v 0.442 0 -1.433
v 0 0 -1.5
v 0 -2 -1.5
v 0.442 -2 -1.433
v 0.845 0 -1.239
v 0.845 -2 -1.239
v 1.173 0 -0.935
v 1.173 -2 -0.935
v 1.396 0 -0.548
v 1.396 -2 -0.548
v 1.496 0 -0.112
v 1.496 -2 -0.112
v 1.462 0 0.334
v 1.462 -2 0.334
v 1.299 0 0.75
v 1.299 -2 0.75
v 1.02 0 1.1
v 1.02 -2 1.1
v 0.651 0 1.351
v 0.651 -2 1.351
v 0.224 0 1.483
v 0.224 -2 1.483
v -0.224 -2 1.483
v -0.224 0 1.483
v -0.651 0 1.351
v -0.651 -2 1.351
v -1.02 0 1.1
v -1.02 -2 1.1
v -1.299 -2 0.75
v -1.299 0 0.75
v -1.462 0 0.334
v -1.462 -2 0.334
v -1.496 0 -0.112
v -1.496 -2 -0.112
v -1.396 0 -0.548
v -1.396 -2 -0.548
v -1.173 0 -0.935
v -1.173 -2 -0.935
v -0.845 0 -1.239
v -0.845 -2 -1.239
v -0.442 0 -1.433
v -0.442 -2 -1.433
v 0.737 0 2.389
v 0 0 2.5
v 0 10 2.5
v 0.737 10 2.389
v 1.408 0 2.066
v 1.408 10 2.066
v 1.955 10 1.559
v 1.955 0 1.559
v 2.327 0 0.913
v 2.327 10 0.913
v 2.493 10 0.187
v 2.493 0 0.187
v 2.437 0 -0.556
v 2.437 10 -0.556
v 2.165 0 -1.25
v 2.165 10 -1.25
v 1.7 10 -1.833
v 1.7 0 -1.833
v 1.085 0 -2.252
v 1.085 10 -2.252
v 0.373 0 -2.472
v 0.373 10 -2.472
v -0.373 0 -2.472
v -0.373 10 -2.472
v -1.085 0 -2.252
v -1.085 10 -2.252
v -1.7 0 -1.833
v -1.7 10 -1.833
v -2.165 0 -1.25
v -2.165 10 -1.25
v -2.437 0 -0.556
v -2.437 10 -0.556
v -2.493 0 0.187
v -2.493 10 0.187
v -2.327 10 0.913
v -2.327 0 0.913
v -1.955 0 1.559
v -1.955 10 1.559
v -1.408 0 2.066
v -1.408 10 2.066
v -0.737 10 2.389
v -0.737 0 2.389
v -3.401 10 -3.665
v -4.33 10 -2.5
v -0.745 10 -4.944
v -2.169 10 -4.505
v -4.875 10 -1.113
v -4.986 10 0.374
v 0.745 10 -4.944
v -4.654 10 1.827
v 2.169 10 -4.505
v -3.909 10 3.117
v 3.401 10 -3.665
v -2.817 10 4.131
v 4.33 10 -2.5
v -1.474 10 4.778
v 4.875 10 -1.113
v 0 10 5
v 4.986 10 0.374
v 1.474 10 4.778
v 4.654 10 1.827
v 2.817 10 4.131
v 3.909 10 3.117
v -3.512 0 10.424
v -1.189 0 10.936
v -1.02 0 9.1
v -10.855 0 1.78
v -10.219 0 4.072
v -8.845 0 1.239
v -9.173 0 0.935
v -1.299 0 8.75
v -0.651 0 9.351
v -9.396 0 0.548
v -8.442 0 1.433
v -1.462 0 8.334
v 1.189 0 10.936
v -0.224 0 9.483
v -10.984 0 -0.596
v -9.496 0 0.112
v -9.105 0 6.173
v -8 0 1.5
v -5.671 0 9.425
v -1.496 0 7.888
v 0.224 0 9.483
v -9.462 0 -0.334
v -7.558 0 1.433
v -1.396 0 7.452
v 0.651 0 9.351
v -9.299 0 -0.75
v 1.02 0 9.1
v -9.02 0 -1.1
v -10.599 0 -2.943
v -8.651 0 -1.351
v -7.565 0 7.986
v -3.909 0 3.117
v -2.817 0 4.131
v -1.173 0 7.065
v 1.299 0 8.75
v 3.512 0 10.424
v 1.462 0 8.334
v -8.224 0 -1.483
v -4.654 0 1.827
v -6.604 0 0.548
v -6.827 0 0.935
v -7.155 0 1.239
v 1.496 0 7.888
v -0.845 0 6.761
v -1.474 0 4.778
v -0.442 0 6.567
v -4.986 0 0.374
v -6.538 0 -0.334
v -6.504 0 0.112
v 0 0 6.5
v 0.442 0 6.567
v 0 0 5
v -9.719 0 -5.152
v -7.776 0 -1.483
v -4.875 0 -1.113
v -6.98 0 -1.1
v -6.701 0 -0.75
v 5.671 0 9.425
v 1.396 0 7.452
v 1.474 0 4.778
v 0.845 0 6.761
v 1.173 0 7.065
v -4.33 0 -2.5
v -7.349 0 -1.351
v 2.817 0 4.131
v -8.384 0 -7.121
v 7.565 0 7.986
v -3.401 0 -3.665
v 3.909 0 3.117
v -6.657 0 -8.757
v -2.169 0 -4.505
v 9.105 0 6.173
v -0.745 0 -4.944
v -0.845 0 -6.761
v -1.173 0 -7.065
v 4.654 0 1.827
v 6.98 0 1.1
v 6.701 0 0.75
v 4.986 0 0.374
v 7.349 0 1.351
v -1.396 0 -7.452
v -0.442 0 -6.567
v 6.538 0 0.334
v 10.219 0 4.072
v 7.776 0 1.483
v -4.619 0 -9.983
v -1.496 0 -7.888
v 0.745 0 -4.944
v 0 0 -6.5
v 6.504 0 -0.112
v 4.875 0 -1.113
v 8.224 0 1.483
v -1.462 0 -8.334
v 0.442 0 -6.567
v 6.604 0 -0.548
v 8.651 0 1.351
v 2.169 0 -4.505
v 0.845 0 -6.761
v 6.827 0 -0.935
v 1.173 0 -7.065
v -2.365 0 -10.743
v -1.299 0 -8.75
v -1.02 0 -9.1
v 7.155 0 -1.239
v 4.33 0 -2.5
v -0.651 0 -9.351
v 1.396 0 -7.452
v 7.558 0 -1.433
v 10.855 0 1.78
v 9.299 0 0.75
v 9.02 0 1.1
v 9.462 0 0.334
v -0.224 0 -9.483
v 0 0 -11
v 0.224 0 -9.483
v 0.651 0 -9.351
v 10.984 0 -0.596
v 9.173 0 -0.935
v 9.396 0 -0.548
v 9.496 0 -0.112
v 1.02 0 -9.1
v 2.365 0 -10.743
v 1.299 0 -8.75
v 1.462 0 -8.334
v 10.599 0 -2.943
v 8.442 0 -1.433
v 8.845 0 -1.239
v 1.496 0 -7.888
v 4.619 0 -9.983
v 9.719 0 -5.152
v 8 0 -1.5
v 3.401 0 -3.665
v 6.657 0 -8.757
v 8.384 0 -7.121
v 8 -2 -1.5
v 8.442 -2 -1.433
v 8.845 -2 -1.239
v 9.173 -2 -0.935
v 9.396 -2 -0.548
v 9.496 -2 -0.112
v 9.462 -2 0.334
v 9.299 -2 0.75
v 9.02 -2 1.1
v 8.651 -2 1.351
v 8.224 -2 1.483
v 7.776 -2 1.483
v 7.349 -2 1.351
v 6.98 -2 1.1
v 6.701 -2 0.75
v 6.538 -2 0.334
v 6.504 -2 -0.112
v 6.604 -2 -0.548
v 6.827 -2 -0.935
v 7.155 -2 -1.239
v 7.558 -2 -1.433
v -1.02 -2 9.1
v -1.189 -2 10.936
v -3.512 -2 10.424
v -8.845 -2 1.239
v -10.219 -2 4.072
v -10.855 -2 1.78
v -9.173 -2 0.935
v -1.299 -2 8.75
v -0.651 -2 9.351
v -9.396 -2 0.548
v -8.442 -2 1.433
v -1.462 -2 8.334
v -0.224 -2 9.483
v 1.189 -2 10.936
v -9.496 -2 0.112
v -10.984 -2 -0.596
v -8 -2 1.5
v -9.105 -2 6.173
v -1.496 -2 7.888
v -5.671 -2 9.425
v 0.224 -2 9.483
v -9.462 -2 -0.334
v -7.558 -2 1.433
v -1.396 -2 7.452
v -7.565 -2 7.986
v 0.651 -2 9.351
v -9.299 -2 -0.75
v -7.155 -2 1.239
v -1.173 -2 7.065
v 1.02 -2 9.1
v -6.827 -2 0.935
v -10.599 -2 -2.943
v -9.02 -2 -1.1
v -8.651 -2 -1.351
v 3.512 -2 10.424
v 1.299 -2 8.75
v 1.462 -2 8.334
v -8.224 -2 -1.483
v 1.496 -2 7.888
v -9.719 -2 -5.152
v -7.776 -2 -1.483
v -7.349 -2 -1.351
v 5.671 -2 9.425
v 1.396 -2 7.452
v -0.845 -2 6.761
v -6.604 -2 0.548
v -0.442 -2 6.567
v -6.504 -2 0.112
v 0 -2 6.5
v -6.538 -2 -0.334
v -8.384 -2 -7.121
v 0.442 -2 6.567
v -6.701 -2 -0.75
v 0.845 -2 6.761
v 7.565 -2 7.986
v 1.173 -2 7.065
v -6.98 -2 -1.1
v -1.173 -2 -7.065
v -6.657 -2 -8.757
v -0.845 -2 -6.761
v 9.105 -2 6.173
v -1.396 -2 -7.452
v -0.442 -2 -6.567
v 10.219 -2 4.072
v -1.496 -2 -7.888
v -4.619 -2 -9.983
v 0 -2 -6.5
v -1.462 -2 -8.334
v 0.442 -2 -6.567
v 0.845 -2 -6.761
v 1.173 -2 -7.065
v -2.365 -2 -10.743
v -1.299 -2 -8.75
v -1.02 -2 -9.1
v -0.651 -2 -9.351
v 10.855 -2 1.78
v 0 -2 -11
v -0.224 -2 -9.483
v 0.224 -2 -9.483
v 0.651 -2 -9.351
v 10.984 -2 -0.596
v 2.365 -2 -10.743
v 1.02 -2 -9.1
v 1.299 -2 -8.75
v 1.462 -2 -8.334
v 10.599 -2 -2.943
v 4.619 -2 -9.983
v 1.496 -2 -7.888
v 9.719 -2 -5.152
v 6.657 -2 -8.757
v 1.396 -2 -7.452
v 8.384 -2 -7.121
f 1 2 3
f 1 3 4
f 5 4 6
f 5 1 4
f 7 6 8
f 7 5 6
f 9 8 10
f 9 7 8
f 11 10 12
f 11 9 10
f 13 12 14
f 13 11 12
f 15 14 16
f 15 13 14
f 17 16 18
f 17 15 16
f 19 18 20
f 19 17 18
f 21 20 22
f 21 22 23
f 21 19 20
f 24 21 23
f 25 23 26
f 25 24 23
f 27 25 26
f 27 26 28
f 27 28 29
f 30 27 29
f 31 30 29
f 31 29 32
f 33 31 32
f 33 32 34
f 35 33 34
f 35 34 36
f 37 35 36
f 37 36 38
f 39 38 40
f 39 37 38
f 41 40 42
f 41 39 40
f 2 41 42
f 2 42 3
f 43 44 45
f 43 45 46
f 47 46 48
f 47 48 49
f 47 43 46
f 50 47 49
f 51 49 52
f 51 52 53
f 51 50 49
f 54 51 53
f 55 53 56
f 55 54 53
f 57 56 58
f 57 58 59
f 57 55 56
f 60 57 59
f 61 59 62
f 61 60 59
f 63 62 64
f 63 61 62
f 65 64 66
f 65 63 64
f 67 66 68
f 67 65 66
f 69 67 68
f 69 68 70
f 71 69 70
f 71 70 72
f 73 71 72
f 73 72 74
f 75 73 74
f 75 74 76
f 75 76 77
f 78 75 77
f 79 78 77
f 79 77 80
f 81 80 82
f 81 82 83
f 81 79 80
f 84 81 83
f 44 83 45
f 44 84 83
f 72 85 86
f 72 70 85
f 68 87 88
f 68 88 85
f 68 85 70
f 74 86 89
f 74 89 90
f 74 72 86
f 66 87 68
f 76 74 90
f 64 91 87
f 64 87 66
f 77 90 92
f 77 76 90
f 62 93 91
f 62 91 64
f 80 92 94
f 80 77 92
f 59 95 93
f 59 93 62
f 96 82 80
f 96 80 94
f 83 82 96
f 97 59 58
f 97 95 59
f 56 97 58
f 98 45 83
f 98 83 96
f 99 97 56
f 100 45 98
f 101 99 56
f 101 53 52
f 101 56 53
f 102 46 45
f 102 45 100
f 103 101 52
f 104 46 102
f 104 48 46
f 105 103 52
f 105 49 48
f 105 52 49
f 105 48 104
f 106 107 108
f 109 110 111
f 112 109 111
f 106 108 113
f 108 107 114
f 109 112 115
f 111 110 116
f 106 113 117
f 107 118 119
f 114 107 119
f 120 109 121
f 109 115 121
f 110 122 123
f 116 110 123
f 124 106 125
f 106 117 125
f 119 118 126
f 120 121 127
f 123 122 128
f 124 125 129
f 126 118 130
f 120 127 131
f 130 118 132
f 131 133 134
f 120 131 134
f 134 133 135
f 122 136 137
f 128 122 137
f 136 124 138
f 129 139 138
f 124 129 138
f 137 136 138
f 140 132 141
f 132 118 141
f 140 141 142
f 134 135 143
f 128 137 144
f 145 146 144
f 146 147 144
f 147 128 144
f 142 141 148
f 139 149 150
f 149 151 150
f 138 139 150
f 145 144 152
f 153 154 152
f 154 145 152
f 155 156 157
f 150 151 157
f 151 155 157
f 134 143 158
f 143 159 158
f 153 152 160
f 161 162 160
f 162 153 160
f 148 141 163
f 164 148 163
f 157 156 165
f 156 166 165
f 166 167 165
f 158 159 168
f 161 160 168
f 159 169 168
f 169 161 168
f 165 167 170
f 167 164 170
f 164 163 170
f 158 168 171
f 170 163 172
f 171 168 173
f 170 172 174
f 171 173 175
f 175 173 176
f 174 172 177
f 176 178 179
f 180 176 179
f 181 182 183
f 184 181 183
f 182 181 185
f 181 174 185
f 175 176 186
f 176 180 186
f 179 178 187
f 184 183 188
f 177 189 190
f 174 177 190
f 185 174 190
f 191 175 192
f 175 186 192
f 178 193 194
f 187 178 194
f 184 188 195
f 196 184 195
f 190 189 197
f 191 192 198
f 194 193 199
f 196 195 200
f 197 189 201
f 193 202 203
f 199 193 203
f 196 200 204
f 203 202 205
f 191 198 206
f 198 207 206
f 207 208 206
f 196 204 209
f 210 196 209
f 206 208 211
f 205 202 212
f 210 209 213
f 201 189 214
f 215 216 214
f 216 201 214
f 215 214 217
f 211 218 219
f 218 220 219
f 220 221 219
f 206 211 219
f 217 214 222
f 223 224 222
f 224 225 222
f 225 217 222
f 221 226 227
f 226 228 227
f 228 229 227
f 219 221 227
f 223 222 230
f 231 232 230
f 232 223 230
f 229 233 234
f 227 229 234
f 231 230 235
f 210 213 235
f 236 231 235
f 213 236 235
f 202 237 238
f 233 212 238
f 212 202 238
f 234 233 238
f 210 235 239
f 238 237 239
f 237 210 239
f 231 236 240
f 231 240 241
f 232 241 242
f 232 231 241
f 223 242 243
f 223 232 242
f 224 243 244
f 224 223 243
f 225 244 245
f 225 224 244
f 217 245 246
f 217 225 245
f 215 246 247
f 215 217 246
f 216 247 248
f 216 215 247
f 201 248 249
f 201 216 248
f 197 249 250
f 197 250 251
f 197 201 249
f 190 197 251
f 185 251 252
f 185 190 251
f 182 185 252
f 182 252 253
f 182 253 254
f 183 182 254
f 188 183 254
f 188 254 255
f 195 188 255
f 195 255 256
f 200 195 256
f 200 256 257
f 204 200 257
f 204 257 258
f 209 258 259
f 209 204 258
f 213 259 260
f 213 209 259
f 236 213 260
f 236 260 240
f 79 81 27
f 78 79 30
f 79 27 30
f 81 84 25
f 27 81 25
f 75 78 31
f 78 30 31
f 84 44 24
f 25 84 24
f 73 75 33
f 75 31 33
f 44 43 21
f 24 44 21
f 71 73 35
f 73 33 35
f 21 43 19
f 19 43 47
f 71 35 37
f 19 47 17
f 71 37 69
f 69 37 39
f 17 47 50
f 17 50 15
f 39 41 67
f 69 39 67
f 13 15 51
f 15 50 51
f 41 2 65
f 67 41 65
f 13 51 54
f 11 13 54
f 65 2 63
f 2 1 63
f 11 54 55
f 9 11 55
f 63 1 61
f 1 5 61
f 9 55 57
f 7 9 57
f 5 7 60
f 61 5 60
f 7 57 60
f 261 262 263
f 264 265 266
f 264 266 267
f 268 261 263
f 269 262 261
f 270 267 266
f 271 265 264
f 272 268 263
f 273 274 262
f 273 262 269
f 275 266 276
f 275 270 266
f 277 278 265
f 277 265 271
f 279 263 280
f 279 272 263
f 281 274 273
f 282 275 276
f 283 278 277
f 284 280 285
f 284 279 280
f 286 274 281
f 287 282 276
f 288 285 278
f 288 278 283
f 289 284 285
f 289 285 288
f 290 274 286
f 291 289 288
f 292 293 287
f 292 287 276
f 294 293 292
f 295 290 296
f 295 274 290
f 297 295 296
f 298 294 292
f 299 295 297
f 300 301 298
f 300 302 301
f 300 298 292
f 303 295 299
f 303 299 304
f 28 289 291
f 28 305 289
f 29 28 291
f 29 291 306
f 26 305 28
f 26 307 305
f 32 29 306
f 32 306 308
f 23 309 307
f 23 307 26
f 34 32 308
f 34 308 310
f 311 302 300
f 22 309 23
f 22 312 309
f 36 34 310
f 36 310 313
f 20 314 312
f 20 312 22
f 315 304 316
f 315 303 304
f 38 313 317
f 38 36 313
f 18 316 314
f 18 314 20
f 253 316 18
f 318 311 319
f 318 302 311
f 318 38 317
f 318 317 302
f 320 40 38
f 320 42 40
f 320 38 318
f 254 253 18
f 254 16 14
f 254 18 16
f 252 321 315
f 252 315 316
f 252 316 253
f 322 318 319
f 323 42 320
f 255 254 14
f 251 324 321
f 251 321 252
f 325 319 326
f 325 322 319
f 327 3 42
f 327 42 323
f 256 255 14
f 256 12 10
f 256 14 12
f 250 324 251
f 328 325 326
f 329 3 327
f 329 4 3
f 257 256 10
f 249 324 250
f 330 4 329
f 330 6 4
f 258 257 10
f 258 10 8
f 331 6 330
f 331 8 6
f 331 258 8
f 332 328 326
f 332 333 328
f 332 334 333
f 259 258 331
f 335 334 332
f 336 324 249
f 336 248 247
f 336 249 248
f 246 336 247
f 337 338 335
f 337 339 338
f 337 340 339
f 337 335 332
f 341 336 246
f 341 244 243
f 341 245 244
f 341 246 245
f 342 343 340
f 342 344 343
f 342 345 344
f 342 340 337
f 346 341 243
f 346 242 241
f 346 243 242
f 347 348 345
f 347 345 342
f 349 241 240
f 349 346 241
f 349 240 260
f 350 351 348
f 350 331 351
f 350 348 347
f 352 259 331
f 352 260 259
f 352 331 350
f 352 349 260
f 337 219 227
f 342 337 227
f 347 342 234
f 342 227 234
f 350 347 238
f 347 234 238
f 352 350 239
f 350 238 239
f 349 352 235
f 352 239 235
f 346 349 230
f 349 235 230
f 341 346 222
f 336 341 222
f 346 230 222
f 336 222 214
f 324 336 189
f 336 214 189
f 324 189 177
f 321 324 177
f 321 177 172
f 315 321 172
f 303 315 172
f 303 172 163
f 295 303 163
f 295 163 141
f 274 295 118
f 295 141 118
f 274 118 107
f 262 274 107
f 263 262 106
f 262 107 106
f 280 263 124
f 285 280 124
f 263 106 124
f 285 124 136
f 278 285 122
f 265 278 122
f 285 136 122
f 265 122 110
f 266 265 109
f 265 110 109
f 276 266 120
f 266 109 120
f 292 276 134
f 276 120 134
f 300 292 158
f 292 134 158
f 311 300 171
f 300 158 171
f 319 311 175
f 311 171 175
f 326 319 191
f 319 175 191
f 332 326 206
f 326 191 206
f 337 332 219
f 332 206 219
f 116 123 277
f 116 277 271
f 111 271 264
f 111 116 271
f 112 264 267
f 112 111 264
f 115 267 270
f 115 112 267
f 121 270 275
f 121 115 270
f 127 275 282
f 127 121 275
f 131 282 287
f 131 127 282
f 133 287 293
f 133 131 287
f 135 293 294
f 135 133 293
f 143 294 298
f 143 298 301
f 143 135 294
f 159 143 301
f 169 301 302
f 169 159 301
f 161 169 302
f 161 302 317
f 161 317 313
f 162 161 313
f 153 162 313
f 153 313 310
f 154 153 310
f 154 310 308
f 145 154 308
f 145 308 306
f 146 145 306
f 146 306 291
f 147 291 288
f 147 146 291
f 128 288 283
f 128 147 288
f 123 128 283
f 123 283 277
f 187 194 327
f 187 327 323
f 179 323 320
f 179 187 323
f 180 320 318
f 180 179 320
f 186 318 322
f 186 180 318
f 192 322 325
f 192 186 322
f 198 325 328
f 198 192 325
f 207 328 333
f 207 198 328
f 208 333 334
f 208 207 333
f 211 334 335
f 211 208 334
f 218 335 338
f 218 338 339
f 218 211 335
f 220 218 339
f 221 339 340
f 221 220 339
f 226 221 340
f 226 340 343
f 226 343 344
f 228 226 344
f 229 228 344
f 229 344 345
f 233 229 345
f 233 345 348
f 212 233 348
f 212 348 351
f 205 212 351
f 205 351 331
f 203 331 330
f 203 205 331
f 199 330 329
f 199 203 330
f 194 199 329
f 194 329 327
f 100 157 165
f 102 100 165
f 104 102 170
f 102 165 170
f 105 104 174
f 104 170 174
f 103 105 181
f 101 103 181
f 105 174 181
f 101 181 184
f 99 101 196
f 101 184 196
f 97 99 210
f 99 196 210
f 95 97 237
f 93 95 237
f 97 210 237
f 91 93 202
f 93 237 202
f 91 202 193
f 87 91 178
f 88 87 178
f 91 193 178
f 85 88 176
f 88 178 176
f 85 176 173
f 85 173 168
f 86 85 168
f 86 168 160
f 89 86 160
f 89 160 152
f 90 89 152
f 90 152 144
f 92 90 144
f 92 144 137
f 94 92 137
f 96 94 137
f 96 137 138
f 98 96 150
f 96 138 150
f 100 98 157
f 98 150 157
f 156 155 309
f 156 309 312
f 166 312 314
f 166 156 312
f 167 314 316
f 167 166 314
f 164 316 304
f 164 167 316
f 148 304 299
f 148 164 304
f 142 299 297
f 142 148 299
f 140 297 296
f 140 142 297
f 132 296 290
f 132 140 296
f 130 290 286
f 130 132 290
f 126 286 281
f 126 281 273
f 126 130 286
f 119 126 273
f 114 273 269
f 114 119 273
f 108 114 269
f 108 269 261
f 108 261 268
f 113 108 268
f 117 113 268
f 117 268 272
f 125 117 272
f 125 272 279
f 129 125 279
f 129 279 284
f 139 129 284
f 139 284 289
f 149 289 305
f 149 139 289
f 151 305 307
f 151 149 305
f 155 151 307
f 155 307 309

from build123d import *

# Parameters (mm, degrees)
SKETCH_1_R      = 5
SKETCH_1_R_2    = 2.5
EXTRUDE_1_DEPTH = 10
SKETCH_2_R      = 11
SKETCH_2_R_2    = 1.5
EXTRUDE_2_DEPTH = 2


with BuildPart() as part:
    # 草图1 → 凸台-拉伸1 (new body)
    with BuildSketch(Plane(origin=(0, 0, 0), x_dir=(1, 0, 0), z_dir=(0, 1, 0))):
        with Locations(Location((0, 0, 0), (0, 0, 270))):
            Circle(SKETCH_1_R)
        with Locations(Location((0, 0, 0), (0, 0, 270))):
            Circle(SKETCH_1_R_2, mode=Mode.SUBTRACT)
    extrude(amount=EXTRUDE_1_DEPTH)

    # 草图2 → 凸台-拉伸2 (add)
    with BuildSketch(Plane.XZ):
        with Locations(Location((0, 0, 0), (0, 0, 270))):
            Circle(SKETCH_2_R)
        with Locations(Location((0, 8, 0), (0, 0, 270))):
            Circle(SKETCH_2_R_2, mode=Mode.SUBTRACT)
        with Locations(Location((8, 0, 0), (0, 0, 270))):
            Circle(SKETCH_2_R_2, mode=Mode.SUBTRACT)
        with Locations(Location((-8, 0, 0), (0, 0, 90))):
            Circle(SKETCH_2_R_2, mode=Mode.SUBTRACT)
        with Locations(Location((0, -8, 0), (0, 0, 90))):
            Circle(SKETCH_2_R_2, mode=Mode.SUBTRACT)
        with Locations(Location((0, 0, 0), (0, 0, 270))):
            Circle(SKETCH_2_R_2, mode=Mode.SUBTRACT)
    extrude(amount=EXTRUDE_2_DEPTH)


solid = part.part
